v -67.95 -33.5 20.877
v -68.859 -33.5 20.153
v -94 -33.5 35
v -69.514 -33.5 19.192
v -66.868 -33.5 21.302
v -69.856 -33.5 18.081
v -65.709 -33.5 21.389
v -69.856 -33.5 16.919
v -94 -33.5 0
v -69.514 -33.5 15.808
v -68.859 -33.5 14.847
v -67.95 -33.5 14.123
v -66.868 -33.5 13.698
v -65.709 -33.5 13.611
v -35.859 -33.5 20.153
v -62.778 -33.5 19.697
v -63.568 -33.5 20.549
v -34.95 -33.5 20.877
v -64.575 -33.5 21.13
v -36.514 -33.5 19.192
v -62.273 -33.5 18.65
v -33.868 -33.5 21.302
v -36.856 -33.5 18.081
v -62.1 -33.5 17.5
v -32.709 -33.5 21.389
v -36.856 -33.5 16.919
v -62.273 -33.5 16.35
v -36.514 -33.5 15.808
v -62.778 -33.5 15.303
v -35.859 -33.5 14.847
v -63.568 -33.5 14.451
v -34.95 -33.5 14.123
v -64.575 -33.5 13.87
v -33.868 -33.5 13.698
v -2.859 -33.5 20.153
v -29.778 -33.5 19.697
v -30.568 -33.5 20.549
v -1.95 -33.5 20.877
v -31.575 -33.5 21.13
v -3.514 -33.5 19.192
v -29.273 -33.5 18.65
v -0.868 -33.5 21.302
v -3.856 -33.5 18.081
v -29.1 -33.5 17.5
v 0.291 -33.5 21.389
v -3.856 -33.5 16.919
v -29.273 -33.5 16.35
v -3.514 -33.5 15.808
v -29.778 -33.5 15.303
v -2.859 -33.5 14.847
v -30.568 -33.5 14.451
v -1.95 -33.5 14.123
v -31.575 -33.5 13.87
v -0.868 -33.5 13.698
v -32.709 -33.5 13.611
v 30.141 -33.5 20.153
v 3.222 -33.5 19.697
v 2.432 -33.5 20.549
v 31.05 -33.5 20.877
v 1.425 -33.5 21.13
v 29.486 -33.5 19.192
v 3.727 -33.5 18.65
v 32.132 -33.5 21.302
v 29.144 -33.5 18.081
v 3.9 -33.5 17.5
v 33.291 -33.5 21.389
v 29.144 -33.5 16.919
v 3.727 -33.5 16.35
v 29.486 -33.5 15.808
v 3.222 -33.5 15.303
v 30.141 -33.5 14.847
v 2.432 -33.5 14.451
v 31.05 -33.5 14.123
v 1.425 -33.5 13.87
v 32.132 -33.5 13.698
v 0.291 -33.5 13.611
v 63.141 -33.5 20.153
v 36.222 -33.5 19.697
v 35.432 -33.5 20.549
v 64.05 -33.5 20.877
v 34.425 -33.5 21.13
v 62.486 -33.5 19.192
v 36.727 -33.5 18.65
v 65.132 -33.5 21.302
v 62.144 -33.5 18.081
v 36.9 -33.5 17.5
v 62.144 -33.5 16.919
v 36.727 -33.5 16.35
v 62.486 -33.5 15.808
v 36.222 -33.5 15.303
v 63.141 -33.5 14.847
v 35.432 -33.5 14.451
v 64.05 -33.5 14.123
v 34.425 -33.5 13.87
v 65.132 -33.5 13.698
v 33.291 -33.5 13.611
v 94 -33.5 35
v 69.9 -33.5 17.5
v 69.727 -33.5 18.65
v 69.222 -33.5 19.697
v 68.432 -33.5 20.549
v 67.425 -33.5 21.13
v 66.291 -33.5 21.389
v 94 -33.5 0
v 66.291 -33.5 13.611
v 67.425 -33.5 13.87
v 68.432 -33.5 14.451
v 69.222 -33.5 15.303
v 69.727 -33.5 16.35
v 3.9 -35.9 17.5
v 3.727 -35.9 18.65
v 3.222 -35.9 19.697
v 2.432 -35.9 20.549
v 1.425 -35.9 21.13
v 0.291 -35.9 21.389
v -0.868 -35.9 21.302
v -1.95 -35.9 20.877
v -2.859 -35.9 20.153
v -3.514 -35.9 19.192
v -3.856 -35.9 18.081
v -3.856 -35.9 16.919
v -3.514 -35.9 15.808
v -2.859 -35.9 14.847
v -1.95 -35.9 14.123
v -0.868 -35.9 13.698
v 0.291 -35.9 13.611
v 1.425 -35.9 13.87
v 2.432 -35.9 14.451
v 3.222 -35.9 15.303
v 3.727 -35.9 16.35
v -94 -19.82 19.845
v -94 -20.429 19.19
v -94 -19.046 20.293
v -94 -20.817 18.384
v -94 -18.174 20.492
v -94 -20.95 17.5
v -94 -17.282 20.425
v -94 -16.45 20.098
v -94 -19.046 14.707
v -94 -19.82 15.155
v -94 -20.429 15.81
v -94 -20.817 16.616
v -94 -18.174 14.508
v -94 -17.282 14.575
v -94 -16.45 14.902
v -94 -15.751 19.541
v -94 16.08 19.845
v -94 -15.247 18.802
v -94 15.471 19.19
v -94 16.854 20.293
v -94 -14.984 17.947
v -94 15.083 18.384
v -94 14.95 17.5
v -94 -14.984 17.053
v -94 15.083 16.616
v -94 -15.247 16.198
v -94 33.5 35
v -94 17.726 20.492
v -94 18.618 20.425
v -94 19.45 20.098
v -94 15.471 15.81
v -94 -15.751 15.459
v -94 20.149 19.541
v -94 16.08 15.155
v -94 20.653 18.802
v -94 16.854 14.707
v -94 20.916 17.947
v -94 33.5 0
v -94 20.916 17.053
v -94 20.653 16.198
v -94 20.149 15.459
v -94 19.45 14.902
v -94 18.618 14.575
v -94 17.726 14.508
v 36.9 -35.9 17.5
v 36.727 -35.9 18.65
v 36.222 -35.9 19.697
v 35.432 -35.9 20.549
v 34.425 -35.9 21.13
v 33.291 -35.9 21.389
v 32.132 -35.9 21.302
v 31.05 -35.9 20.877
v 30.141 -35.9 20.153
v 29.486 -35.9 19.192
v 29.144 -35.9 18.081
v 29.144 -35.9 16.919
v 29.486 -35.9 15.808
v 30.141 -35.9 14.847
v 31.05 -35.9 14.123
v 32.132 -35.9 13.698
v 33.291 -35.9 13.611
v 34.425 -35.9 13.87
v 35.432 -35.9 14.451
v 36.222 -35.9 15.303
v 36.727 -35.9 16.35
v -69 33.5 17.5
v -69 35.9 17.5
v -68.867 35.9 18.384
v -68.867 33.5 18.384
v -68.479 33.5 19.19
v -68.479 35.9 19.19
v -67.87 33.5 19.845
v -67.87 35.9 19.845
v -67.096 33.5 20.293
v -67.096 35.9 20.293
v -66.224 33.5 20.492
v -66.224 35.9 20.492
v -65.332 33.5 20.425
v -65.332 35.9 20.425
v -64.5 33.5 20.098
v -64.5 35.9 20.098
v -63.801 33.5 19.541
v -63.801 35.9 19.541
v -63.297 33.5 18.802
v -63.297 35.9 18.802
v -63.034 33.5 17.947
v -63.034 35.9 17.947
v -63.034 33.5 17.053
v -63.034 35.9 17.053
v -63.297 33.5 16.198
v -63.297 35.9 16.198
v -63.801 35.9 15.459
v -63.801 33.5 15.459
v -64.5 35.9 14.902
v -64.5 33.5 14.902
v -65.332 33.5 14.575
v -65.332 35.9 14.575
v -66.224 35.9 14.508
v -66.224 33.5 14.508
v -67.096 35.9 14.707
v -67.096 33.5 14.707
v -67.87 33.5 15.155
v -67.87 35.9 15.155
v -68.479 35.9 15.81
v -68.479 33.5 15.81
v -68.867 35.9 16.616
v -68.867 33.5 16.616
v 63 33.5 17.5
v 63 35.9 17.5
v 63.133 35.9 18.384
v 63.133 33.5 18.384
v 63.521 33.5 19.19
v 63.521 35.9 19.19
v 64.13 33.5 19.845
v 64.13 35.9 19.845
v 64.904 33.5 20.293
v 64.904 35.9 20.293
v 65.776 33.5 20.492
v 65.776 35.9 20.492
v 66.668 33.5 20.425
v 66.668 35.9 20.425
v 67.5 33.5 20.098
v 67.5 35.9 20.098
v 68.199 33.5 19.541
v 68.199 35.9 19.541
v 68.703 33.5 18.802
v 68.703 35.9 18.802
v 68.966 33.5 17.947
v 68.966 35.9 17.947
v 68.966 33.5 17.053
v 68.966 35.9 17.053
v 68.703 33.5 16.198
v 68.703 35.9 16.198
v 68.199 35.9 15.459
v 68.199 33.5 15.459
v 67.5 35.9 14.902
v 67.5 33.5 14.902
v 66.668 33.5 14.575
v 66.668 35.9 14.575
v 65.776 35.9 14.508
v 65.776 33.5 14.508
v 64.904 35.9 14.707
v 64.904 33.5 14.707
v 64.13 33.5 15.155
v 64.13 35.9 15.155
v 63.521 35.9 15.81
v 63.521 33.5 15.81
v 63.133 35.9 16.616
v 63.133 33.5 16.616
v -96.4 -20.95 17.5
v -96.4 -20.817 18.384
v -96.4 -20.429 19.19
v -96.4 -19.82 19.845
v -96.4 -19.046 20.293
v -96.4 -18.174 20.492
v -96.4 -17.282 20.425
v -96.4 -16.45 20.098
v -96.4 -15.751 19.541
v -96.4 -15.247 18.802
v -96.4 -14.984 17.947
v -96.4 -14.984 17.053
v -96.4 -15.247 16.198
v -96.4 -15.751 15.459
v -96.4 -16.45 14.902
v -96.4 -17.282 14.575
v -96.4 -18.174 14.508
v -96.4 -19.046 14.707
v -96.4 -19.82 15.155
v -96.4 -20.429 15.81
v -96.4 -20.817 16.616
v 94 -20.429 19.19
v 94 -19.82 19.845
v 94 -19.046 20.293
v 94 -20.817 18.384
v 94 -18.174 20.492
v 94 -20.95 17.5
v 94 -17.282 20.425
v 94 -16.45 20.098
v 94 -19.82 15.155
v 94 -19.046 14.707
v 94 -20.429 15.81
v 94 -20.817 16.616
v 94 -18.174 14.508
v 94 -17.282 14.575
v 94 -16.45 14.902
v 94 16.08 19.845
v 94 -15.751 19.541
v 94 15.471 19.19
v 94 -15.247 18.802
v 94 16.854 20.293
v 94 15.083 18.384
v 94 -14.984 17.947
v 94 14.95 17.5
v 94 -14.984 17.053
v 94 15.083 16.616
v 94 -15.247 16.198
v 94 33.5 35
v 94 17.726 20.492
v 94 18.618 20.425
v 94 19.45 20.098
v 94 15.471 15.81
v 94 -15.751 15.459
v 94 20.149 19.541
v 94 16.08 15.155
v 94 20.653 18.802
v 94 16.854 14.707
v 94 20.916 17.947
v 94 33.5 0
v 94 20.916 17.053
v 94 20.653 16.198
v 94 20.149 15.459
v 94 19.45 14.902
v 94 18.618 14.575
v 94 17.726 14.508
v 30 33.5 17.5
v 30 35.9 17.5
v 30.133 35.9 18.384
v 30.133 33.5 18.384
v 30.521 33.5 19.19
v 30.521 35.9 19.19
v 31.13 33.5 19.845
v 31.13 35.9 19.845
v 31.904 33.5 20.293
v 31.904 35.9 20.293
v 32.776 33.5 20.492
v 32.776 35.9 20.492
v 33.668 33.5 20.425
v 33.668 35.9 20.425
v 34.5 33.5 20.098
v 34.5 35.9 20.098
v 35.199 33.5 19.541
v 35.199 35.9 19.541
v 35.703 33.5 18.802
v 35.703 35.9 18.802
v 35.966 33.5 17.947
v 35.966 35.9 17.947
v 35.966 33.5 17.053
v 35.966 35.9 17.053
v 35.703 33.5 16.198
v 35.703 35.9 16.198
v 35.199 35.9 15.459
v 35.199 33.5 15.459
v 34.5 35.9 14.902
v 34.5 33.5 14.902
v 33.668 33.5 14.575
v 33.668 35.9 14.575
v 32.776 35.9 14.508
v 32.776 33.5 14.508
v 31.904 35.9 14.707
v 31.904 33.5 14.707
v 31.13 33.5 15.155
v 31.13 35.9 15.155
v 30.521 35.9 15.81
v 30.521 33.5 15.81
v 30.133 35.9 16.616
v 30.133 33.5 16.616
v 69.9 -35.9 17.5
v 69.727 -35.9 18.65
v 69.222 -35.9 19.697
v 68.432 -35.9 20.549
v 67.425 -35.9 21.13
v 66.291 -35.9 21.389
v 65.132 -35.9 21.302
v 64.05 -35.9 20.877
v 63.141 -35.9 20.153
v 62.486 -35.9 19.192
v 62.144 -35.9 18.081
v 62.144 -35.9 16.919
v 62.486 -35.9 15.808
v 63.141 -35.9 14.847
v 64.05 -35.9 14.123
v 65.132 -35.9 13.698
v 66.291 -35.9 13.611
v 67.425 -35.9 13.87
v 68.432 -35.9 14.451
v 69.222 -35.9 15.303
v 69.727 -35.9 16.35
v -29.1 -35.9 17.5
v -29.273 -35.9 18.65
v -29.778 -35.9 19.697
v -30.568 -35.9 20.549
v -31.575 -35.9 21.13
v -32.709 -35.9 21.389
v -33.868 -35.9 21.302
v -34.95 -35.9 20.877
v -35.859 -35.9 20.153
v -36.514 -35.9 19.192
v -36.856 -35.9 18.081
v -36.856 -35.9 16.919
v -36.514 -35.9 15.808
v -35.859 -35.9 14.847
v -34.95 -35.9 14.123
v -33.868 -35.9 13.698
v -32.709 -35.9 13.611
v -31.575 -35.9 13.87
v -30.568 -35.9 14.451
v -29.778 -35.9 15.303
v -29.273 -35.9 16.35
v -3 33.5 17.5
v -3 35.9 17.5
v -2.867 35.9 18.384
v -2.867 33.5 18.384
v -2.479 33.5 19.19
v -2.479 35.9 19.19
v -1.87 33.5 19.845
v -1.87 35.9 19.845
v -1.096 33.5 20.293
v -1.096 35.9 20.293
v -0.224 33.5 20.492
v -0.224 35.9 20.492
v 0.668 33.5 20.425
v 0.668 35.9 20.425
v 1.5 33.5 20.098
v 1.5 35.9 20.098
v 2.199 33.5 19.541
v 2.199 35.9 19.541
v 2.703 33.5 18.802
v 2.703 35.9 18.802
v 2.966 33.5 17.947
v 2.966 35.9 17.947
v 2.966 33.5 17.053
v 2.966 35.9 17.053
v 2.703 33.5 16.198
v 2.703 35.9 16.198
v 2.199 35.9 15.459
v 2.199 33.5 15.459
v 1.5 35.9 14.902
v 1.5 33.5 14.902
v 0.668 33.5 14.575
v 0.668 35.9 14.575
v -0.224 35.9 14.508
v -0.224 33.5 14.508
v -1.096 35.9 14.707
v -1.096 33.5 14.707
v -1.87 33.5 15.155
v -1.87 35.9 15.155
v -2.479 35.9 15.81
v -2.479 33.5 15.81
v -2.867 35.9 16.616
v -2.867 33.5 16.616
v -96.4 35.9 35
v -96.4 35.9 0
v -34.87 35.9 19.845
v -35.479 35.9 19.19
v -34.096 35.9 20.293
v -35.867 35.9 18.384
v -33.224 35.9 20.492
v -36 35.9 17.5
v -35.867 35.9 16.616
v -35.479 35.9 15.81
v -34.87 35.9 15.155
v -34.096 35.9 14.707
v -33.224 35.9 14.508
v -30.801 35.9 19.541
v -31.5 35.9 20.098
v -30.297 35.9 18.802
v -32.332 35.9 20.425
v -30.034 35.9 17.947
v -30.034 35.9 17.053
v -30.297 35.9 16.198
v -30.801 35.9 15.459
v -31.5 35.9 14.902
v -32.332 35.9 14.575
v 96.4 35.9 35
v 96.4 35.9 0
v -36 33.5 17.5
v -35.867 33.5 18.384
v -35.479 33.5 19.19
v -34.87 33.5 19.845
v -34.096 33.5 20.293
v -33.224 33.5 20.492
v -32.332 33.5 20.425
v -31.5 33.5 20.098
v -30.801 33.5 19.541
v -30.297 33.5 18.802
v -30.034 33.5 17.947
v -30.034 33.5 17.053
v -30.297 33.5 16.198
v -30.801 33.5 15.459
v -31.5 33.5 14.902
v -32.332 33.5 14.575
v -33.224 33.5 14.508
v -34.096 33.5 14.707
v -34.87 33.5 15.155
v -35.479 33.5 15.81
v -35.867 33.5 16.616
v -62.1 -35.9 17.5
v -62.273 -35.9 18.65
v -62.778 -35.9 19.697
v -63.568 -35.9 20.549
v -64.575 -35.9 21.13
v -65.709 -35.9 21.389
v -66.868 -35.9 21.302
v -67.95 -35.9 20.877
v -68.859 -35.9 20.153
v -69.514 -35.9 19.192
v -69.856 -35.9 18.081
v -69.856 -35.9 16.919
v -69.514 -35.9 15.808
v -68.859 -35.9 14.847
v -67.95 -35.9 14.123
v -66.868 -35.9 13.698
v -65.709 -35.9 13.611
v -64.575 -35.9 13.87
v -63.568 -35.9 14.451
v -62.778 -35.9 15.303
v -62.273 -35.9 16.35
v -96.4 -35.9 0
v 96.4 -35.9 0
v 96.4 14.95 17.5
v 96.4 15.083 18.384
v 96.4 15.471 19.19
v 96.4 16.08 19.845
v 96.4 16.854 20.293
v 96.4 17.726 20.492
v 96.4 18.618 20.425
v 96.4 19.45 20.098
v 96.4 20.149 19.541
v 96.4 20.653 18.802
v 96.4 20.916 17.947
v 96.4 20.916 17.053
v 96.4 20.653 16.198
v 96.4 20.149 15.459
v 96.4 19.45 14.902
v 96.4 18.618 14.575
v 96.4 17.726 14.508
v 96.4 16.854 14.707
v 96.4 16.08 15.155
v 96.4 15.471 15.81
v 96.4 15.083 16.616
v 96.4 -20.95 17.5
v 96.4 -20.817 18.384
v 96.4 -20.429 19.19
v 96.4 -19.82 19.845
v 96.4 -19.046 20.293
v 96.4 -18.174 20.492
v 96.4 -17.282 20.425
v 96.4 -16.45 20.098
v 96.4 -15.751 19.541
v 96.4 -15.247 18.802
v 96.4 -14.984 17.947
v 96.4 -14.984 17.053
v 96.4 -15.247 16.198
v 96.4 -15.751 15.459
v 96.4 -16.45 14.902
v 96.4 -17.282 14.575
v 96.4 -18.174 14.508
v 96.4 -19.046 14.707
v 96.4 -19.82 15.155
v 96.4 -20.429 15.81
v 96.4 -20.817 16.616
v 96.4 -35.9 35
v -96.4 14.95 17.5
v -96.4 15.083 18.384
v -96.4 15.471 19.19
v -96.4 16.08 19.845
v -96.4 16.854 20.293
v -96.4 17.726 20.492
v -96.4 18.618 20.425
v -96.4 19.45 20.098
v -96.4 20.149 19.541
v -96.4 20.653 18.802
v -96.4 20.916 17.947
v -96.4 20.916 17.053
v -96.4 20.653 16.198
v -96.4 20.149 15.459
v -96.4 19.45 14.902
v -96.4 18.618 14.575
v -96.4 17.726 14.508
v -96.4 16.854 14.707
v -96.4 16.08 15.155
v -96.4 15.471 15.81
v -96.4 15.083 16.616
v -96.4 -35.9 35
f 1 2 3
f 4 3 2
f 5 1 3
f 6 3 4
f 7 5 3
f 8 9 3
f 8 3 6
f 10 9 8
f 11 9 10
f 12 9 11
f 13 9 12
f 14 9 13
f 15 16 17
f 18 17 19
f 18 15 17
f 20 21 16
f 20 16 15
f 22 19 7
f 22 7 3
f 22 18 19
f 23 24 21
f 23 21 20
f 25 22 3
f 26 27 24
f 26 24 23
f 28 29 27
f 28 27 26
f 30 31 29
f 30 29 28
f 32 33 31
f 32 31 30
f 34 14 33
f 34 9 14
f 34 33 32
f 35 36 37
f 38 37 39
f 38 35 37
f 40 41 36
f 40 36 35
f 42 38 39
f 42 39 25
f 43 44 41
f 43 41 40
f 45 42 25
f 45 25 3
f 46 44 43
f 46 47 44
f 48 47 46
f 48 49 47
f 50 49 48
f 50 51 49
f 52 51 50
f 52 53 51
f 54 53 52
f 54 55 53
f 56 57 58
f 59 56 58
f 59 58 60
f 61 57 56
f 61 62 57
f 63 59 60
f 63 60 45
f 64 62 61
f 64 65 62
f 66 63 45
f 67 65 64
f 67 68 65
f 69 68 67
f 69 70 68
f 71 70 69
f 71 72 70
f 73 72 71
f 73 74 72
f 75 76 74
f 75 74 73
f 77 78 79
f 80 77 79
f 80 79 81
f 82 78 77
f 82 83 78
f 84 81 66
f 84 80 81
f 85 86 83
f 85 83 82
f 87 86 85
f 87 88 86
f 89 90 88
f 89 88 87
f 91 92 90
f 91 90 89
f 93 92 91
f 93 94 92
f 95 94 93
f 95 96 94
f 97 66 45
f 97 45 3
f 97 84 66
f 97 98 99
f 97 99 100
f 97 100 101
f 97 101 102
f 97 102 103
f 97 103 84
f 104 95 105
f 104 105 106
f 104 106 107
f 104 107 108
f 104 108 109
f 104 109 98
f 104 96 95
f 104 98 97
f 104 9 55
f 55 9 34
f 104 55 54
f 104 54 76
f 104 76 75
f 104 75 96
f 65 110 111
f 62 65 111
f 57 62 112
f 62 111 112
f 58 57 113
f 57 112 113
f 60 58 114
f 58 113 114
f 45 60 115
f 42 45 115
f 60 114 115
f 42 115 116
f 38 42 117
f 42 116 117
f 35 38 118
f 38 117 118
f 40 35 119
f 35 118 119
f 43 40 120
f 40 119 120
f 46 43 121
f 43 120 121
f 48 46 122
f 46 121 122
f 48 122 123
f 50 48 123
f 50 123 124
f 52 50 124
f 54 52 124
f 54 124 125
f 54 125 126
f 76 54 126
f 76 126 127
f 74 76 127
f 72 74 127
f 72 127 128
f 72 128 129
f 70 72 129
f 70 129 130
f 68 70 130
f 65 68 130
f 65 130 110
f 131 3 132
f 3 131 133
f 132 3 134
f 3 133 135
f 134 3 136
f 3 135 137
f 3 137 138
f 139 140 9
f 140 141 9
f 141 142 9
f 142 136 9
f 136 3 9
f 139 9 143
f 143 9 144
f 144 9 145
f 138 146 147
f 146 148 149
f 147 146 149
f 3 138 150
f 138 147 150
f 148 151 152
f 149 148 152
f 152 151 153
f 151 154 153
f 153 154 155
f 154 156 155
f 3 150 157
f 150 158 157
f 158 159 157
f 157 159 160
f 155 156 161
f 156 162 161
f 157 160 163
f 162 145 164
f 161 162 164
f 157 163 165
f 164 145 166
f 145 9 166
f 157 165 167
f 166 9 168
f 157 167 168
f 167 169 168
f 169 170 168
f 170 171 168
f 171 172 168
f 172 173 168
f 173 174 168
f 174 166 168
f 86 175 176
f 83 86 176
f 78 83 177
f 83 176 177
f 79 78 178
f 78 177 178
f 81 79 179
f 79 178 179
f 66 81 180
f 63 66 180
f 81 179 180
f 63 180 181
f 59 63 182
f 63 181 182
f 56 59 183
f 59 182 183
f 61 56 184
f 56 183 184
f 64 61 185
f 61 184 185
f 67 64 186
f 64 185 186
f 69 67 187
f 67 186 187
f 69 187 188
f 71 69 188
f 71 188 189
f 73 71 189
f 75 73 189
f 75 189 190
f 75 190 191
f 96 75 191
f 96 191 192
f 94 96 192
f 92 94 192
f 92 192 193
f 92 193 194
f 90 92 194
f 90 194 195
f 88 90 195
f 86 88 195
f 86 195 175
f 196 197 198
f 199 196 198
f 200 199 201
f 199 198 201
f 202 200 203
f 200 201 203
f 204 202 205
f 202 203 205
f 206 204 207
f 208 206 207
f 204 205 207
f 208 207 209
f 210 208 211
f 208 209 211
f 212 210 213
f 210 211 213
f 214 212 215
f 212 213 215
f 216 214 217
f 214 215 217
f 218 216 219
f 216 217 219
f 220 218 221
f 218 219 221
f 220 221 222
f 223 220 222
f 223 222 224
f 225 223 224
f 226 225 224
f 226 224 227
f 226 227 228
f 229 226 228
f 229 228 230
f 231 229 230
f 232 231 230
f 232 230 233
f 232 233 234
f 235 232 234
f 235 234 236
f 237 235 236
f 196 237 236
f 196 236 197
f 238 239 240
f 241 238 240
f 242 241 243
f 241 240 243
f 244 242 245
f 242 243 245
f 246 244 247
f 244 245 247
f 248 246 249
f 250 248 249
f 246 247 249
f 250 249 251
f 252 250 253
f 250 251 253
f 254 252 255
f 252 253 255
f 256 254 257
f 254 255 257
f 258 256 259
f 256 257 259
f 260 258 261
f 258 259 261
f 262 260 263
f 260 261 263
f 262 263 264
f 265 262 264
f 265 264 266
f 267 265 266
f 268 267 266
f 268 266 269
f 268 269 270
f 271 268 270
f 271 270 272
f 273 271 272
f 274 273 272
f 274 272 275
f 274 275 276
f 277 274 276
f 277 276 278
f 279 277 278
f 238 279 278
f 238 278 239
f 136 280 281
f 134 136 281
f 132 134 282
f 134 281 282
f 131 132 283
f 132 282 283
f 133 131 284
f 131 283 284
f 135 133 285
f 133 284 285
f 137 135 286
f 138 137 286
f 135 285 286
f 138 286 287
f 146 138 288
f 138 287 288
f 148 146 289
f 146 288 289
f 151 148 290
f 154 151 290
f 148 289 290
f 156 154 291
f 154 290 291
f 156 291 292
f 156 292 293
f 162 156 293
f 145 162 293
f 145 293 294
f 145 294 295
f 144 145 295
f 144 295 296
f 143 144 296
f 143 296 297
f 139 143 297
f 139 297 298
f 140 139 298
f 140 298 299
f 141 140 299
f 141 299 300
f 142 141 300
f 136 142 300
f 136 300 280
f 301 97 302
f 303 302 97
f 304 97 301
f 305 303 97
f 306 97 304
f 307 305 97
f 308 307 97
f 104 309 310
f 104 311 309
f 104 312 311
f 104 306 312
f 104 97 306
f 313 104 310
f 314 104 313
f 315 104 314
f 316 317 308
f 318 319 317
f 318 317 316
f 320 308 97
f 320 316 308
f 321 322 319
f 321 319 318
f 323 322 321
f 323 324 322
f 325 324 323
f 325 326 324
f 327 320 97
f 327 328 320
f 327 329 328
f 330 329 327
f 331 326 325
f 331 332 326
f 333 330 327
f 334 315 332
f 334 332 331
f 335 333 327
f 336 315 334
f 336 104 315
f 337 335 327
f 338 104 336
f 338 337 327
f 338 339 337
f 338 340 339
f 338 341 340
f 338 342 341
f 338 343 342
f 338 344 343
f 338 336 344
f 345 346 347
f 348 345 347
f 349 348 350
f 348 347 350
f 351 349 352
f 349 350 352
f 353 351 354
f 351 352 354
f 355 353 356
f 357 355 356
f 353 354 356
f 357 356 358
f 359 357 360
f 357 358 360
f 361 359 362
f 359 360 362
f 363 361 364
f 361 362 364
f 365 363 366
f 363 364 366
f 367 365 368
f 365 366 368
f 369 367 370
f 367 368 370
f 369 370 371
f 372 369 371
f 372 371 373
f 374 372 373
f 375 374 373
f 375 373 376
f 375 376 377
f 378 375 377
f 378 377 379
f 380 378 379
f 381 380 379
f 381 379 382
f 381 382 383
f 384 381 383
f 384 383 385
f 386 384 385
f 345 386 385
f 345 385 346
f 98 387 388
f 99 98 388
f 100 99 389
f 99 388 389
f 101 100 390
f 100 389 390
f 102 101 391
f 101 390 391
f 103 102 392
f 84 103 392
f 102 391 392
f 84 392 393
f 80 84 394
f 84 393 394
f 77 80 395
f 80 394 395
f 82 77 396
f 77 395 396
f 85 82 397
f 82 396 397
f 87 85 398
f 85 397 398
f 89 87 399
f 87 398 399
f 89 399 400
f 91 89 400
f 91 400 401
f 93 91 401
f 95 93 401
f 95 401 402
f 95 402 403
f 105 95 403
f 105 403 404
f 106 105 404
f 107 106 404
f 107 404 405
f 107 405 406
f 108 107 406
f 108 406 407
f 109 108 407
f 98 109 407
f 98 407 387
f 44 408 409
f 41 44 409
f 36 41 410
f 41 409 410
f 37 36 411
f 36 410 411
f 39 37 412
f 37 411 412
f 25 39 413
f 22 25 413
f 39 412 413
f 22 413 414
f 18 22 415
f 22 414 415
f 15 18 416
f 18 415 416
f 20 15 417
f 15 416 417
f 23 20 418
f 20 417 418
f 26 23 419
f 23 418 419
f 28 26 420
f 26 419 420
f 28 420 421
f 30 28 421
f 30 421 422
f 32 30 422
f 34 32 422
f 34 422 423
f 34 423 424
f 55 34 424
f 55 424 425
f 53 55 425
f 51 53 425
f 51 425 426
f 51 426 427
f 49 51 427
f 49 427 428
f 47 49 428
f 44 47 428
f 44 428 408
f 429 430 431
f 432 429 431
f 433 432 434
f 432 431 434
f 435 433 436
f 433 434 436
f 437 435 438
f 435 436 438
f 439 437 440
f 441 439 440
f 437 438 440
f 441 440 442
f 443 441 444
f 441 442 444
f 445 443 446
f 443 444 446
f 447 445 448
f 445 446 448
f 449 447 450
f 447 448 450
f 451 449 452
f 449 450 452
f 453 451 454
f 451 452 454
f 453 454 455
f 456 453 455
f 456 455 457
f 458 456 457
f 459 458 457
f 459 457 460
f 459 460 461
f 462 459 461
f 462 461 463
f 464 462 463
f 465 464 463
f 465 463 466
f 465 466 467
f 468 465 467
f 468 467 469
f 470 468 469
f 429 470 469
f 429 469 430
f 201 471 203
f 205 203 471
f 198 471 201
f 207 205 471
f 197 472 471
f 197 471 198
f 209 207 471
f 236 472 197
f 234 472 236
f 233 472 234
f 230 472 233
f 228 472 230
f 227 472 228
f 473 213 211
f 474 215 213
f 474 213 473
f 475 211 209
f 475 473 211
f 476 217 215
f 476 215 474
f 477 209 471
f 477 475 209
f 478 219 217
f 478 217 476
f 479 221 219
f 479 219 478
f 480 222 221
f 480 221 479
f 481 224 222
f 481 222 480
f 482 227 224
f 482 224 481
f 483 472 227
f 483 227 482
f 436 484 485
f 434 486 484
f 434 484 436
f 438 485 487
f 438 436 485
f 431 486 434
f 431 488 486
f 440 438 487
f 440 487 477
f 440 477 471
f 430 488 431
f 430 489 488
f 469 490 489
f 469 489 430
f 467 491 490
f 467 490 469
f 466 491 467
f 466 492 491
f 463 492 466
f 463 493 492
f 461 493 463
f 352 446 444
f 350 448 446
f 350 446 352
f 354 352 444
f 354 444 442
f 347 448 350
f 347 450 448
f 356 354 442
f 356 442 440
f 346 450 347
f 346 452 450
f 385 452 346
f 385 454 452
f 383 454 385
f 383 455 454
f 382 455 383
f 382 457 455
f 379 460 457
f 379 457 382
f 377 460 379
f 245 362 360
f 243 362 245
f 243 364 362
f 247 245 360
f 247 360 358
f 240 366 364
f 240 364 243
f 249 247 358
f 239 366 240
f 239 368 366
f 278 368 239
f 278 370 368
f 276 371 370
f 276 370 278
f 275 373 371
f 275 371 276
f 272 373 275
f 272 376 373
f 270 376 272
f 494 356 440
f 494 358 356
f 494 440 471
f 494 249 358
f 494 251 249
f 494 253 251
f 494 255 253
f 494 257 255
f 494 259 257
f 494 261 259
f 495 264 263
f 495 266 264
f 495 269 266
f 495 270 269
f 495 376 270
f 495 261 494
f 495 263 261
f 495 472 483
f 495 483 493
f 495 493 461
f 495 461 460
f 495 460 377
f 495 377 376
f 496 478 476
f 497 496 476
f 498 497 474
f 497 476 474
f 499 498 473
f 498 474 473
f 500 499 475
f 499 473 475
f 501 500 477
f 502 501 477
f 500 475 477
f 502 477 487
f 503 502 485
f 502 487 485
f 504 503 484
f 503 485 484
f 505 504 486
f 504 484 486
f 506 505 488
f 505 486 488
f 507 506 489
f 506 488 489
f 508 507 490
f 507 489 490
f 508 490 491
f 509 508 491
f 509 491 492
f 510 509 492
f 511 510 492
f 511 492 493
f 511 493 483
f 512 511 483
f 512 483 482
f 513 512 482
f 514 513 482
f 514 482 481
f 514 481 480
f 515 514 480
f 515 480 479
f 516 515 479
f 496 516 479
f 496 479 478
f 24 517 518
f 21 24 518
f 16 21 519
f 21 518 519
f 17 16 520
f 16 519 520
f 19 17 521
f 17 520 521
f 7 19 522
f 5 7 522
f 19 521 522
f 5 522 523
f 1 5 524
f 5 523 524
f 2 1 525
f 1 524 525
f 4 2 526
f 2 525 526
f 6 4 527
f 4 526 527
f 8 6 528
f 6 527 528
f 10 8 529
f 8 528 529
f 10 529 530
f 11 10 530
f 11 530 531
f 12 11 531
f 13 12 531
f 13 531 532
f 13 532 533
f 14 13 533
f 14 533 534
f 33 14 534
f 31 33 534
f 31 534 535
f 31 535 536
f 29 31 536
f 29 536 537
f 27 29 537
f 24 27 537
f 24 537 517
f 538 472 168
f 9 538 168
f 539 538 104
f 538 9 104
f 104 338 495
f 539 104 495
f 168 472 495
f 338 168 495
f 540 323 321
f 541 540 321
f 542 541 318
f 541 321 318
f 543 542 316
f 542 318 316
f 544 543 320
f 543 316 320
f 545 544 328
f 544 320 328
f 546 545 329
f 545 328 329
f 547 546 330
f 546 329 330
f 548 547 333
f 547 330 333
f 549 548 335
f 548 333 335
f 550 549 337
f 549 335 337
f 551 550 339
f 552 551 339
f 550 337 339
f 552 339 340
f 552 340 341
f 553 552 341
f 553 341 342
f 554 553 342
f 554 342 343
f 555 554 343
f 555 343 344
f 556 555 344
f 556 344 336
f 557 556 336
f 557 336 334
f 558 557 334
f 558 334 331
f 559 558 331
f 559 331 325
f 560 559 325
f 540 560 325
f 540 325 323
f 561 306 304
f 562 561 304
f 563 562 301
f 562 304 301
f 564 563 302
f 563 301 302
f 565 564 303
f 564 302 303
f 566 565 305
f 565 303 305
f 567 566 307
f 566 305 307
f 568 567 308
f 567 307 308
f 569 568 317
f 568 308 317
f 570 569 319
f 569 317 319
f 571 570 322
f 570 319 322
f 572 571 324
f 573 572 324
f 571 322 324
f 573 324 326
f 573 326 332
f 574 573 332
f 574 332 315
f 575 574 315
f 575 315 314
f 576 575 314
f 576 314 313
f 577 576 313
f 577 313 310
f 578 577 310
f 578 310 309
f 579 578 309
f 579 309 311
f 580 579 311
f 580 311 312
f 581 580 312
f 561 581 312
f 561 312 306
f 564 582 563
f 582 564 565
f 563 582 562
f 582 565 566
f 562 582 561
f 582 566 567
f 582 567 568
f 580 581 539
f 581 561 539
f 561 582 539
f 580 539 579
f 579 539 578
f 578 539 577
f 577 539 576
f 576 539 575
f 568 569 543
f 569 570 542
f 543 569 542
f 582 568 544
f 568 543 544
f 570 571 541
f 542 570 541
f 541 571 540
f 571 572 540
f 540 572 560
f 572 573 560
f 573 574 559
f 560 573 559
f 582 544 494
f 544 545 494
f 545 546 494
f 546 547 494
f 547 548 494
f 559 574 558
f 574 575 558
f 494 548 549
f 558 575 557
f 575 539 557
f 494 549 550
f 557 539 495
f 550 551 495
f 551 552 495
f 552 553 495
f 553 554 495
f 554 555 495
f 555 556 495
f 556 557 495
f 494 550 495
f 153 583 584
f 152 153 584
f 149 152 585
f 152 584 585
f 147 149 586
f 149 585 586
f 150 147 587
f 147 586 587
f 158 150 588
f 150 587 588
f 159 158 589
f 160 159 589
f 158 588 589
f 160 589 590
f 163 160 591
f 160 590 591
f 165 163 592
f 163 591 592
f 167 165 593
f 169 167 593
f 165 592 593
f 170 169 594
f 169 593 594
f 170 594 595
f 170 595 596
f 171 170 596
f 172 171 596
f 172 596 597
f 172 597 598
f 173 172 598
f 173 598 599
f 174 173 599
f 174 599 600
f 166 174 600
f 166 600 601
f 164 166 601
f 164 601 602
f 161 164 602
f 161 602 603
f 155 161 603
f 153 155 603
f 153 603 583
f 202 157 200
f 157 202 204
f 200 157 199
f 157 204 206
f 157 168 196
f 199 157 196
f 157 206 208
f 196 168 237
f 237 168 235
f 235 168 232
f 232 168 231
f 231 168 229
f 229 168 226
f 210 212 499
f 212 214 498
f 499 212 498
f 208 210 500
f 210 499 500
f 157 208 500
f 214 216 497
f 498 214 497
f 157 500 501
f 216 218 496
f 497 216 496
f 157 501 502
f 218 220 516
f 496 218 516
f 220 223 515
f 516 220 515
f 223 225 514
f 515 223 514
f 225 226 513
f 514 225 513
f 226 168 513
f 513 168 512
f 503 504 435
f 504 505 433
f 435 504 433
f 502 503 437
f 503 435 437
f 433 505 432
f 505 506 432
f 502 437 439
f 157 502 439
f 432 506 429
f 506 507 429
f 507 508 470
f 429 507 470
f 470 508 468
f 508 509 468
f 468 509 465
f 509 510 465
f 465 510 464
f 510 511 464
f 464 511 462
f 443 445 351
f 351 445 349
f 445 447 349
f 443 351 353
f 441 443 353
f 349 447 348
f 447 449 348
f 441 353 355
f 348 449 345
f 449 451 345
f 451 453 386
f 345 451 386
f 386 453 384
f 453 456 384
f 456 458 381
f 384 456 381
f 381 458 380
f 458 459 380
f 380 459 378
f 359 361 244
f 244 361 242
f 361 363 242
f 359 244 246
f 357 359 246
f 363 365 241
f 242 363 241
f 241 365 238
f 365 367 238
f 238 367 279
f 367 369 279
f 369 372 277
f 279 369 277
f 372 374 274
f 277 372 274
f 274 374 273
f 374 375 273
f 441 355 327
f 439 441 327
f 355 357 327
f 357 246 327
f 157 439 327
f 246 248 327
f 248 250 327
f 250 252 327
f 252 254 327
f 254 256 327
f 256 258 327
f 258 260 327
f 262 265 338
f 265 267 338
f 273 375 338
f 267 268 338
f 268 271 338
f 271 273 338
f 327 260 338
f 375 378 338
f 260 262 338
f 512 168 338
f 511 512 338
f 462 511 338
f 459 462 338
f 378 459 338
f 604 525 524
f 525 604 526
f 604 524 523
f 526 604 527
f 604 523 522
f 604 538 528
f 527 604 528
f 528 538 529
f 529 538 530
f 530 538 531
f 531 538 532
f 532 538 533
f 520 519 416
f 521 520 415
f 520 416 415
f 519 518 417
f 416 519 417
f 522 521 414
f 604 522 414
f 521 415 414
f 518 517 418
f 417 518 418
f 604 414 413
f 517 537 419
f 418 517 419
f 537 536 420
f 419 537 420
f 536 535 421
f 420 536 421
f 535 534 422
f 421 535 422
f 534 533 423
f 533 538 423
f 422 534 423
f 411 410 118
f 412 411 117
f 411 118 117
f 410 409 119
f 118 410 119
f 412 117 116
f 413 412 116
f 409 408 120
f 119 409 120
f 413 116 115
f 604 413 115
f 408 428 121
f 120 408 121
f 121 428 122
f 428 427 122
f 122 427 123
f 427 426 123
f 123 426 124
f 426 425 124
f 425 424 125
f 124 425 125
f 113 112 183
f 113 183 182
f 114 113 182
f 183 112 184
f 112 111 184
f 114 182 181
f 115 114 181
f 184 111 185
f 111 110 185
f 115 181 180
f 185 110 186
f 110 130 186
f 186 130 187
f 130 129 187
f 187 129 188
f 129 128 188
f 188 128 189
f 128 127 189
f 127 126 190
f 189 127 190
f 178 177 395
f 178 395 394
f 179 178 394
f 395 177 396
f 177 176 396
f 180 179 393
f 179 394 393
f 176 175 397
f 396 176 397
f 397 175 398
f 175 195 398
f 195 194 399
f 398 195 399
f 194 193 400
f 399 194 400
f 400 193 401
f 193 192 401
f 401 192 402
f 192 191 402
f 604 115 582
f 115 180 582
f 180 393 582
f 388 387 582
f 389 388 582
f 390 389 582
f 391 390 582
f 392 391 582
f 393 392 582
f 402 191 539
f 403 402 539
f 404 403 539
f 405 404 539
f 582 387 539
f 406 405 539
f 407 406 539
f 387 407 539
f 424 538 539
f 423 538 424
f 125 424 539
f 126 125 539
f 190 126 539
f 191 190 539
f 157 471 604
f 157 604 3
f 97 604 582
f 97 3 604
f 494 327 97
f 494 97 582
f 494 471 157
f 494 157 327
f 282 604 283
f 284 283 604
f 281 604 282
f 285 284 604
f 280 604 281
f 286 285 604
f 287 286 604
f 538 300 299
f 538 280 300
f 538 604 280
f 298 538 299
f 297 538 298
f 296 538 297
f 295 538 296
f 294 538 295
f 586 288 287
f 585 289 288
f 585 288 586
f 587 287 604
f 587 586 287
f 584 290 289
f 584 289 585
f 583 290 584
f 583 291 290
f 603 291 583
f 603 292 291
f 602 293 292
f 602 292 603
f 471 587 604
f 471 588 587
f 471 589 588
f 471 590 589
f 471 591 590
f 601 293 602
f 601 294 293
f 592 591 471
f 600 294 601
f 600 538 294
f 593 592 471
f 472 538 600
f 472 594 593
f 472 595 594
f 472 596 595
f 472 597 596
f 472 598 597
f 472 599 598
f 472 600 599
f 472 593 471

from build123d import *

# Parameters (mm, degrees)
F0_W     = 192.8
F0_H     = 71.8
F0_W_2   = 188
F0_H_2   = 67
F1_DEPTH = 35
F2_R     = 3
F3_DEPTH = 192.801
F4_R     = 3.9
F5_DEPTH = 25
F6_R     = 3
F7_DEPTH = 25


with BuildPart() as f1:
    # F0 (on Top) → F1 (new body)
    with BuildSketch(Plane.XY):
        Rectangle(F0_W, F0_H)
        Rectangle(F0_W_2, F0_H_2, mode=Mode.SUBTRACT)
    extrude(amount=F1_DEPTH)

    # F2 (on face) → F3 (cut, through all)
    with BuildSketch(Plane(origin=(-96.4, 0, 0), x_dir=(0, -1, 0), z_dir=(-1, 0, 0))):
        with Locations((-17.95, 17.5)):
            Circle(F2_R)
        with Locations((17.95, 17.5)):
            Circle(F2_R)
    extrude(amount=-F3_DEPTH, mode=Mode.SUBTRACT)

    # F4 (on face) → F5 (cut)
    with BuildSketch(Plane.XZ.offset(35.9)):
        with Locations((0, 17.5)):
            Circle(F4_R)
        with Locations((33, 17.5)):
            Circle(F4_R)
        with Locations((66, 17.5)):
            Circle(F4_R)
        with Locations((-33, 17.5)):
            Circle(F4_R)
        with Locations((-66, 17.5)):
            Circle(F4_R)
    extrude(amount=-F5_DEPTH, mode=Mode.SUBTRACT)

    # F6 (on face) → F7 (cut)
    with BuildSketch(Plane(origin=(0, 35.9, 0), x_dir=(-1, 0, 0), z_dir=(0, 1, 0))):
        with Locations((0, 17.5)):
            Circle(F6_R)
        with Locations((33, 17.5)):
            Circle(F6_R)
        with Locations((66, 17.5)):
            Circle(F6_R)
        with Locations((-33, 17.5)):
            Circle(F6_R)
        with Locations((-66, 17.5)):
            Circle(F6_R)
    extrude(amount=-F7_DEPTH, mode=Mode.SUBTRACT)


solid = f1.part
